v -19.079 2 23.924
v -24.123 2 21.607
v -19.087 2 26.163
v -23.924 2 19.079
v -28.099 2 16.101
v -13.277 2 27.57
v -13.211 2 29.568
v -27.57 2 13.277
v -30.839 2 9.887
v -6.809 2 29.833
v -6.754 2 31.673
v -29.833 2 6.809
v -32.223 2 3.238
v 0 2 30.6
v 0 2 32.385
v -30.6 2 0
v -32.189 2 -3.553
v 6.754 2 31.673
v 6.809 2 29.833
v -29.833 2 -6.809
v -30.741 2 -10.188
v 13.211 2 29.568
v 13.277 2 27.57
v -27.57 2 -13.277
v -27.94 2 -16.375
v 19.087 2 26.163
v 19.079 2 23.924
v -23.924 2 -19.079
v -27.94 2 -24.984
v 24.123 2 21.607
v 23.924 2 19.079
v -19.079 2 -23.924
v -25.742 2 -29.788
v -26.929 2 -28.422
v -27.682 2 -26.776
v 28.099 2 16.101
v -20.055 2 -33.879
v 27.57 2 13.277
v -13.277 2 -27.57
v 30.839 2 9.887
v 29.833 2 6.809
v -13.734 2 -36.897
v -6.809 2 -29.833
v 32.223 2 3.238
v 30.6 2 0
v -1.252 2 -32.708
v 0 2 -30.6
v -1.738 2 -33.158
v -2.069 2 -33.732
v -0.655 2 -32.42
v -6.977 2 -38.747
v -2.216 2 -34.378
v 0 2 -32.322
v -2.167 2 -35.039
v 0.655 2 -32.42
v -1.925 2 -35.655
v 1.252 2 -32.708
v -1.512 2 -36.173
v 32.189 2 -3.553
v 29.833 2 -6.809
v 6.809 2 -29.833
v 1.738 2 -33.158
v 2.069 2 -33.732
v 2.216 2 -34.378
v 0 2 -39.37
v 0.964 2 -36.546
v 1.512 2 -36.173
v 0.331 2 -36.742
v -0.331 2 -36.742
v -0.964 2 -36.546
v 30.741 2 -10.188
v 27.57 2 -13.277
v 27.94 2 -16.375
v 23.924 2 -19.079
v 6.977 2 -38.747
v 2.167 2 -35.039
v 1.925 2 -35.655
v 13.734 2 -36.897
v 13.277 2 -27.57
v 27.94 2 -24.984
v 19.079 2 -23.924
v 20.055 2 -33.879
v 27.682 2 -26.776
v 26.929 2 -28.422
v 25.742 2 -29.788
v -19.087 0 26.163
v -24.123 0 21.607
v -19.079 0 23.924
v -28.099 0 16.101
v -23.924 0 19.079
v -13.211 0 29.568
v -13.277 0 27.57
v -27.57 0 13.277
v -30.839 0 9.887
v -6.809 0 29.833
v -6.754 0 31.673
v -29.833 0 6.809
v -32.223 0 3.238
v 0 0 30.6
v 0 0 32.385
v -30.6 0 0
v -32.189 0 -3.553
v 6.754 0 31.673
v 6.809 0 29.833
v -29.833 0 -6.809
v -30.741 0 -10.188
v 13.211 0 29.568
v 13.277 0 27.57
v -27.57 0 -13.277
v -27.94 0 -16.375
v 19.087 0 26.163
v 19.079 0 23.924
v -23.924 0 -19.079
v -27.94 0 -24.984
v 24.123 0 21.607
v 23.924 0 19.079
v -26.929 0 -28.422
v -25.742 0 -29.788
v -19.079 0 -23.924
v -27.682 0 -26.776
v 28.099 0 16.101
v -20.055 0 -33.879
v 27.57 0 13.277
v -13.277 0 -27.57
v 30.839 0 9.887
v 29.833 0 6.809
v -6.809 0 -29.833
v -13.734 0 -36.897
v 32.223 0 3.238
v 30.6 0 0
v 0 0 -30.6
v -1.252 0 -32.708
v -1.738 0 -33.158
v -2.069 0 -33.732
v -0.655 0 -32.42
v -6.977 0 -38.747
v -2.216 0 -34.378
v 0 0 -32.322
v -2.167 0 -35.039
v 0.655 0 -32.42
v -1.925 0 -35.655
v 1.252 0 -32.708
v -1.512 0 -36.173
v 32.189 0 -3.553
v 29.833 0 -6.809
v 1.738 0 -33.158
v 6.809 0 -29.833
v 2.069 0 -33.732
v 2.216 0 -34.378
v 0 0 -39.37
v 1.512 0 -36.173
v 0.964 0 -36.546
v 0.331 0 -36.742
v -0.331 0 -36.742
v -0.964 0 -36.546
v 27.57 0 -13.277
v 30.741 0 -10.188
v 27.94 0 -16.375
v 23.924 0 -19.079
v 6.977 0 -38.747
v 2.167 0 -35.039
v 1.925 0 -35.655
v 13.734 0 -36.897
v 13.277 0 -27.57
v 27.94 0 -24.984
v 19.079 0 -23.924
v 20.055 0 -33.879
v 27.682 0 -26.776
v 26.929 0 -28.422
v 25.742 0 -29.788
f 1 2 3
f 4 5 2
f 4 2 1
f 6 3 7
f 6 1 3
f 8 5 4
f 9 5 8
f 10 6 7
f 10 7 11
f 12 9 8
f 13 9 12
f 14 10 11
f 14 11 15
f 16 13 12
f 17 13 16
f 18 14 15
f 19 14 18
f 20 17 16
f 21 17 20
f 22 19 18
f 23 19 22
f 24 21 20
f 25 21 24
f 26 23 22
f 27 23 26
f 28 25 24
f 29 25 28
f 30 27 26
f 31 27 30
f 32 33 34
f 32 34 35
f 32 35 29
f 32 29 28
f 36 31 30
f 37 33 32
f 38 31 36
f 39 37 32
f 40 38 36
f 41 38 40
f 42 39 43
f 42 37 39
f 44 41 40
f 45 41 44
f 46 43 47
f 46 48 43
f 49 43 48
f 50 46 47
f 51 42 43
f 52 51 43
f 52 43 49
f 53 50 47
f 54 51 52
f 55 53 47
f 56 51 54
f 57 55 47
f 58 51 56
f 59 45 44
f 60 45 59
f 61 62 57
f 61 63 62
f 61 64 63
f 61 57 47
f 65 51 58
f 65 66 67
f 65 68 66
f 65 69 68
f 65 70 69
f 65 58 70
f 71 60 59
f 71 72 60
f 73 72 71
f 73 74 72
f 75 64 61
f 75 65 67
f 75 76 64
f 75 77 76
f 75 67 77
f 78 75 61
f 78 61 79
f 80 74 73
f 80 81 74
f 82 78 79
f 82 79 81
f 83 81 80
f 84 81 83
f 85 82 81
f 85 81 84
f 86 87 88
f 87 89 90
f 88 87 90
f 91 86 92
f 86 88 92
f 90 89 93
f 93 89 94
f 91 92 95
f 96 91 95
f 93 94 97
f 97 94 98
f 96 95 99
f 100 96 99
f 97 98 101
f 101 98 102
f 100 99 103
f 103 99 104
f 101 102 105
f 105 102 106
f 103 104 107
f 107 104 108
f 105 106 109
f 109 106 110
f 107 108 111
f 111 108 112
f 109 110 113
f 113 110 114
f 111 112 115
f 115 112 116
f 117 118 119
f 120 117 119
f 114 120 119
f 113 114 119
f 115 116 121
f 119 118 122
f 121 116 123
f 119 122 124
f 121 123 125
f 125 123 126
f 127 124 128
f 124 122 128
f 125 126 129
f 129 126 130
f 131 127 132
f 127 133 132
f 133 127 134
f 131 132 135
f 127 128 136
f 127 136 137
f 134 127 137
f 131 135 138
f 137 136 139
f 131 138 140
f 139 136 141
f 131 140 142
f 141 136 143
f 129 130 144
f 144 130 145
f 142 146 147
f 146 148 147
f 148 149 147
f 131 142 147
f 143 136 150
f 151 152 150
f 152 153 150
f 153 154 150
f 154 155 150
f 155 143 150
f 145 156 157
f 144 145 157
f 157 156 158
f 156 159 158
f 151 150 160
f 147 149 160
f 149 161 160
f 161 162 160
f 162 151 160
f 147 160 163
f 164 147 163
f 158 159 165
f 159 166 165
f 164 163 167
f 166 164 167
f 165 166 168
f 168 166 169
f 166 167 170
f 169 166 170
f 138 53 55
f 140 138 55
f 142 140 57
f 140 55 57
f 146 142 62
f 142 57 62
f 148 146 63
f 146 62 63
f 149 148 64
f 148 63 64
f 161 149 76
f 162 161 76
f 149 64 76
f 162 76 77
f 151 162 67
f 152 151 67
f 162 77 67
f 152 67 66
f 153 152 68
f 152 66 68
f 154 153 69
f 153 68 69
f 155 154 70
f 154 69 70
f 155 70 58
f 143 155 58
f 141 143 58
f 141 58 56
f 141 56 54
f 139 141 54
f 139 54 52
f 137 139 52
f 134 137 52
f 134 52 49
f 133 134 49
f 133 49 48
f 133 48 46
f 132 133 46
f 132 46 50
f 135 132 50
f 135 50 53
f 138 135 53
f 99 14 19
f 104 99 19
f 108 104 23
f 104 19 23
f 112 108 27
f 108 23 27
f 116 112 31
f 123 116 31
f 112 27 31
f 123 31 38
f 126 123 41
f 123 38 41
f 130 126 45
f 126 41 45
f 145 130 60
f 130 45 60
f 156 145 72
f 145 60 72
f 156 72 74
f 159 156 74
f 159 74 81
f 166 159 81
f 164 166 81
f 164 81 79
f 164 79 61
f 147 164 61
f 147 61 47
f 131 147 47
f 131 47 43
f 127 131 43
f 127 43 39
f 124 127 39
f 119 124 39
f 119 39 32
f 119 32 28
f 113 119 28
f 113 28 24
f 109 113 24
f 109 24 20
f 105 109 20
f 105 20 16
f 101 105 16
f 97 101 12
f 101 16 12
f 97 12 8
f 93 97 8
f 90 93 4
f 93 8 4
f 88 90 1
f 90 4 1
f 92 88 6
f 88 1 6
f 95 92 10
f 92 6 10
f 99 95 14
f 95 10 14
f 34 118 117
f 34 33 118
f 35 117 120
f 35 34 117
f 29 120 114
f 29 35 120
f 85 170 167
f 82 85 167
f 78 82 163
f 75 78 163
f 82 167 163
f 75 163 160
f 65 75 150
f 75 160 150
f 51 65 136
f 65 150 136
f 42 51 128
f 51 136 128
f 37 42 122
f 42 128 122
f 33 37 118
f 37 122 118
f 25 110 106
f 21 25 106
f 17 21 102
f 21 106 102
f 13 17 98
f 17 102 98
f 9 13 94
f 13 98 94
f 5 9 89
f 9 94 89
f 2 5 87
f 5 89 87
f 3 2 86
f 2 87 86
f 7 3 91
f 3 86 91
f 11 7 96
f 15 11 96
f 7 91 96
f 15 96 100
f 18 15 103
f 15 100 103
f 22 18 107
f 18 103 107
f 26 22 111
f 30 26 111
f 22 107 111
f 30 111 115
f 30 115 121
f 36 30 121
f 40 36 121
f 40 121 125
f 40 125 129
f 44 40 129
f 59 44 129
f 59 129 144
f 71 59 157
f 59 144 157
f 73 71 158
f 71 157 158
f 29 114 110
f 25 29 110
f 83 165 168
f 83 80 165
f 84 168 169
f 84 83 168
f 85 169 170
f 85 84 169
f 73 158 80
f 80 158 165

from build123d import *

# Parameters (mm, degrees)
SKETCH1_R           = 32.385
BOSS_EXTRUDE1_DEPTH = 2
FILLET1_R           = 6.35
SKETCH2_R           = 2.2225
CUT_EXTRUDE1_DEPTH  = 52.017498224
SKETCH3_R           = 30.6
CUT_EXTRUDE2_DEPTH  = 52.017498224


with BuildPart() as part:
    # Sketch1 → Boss-Extrude1 (new body)
    with BuildSketch(Plane(origin=(0, 0, 0), x_dir=(1, 0, 0), z_dir=(0, 1, 0))):
        Circle(SKETCH1_R)
        with BuildLine():
            Line((-27.94, 27.737218678), (-27.94, 16.375122137))
            ThreePointArc((-27.94, 16.375122137), (0, 32.385), (27.94, 16.375122137))
            Line((27.94, 16.375122137), (27.94, 27.737218678))
            ThreePointArc((27.94, 27.737218678), (0, 39.37), (-27.94, 27.737218678))
        make_face()
    extrude(amount=BOSS_EXTRUDE1_DEPTH)

    # Fillet1
    fillet1_edges = [part.edges().sort_by_distance(p)[0] for p in [
        (-27.94, 1, -27.737218678),
        (27.94, 1, -27.737218678),
    ]]
    fillet(fillet1_edges, radius=FILLET1_R)

    # Sketch2 → Cut-Extrude1 (cut, through all)
    with BuildSketch(Plane(origin=(0, 2, 0), x_dir=(1, 0, 0), z_dir=(0, 1, 0))):
        with Locations(Location((0, 34.544, 0), (0, 0, 270))):
            Circle(SKETCH2_R)
    extrude(amount=-CUT_EXTRUDE1_DEPTH, mode=Mode.SUBTRACT)

    # Sketch3 → Cut-Extrude2 (cut, through all)
    with BuildSketch(Plane(origin=(0, 2, 0), x_dir=(1, 0, 0), z_dir=(0, 1, 0))):
        with Locations(Location((0, 0, 0), (0, 0, 270))):
            Circle(SKETCH3_R)
    extrude(amount=-CUT_EXTRUDE2_DEPTH, mode=Mode.SUBTRACT)


solid = part.part
